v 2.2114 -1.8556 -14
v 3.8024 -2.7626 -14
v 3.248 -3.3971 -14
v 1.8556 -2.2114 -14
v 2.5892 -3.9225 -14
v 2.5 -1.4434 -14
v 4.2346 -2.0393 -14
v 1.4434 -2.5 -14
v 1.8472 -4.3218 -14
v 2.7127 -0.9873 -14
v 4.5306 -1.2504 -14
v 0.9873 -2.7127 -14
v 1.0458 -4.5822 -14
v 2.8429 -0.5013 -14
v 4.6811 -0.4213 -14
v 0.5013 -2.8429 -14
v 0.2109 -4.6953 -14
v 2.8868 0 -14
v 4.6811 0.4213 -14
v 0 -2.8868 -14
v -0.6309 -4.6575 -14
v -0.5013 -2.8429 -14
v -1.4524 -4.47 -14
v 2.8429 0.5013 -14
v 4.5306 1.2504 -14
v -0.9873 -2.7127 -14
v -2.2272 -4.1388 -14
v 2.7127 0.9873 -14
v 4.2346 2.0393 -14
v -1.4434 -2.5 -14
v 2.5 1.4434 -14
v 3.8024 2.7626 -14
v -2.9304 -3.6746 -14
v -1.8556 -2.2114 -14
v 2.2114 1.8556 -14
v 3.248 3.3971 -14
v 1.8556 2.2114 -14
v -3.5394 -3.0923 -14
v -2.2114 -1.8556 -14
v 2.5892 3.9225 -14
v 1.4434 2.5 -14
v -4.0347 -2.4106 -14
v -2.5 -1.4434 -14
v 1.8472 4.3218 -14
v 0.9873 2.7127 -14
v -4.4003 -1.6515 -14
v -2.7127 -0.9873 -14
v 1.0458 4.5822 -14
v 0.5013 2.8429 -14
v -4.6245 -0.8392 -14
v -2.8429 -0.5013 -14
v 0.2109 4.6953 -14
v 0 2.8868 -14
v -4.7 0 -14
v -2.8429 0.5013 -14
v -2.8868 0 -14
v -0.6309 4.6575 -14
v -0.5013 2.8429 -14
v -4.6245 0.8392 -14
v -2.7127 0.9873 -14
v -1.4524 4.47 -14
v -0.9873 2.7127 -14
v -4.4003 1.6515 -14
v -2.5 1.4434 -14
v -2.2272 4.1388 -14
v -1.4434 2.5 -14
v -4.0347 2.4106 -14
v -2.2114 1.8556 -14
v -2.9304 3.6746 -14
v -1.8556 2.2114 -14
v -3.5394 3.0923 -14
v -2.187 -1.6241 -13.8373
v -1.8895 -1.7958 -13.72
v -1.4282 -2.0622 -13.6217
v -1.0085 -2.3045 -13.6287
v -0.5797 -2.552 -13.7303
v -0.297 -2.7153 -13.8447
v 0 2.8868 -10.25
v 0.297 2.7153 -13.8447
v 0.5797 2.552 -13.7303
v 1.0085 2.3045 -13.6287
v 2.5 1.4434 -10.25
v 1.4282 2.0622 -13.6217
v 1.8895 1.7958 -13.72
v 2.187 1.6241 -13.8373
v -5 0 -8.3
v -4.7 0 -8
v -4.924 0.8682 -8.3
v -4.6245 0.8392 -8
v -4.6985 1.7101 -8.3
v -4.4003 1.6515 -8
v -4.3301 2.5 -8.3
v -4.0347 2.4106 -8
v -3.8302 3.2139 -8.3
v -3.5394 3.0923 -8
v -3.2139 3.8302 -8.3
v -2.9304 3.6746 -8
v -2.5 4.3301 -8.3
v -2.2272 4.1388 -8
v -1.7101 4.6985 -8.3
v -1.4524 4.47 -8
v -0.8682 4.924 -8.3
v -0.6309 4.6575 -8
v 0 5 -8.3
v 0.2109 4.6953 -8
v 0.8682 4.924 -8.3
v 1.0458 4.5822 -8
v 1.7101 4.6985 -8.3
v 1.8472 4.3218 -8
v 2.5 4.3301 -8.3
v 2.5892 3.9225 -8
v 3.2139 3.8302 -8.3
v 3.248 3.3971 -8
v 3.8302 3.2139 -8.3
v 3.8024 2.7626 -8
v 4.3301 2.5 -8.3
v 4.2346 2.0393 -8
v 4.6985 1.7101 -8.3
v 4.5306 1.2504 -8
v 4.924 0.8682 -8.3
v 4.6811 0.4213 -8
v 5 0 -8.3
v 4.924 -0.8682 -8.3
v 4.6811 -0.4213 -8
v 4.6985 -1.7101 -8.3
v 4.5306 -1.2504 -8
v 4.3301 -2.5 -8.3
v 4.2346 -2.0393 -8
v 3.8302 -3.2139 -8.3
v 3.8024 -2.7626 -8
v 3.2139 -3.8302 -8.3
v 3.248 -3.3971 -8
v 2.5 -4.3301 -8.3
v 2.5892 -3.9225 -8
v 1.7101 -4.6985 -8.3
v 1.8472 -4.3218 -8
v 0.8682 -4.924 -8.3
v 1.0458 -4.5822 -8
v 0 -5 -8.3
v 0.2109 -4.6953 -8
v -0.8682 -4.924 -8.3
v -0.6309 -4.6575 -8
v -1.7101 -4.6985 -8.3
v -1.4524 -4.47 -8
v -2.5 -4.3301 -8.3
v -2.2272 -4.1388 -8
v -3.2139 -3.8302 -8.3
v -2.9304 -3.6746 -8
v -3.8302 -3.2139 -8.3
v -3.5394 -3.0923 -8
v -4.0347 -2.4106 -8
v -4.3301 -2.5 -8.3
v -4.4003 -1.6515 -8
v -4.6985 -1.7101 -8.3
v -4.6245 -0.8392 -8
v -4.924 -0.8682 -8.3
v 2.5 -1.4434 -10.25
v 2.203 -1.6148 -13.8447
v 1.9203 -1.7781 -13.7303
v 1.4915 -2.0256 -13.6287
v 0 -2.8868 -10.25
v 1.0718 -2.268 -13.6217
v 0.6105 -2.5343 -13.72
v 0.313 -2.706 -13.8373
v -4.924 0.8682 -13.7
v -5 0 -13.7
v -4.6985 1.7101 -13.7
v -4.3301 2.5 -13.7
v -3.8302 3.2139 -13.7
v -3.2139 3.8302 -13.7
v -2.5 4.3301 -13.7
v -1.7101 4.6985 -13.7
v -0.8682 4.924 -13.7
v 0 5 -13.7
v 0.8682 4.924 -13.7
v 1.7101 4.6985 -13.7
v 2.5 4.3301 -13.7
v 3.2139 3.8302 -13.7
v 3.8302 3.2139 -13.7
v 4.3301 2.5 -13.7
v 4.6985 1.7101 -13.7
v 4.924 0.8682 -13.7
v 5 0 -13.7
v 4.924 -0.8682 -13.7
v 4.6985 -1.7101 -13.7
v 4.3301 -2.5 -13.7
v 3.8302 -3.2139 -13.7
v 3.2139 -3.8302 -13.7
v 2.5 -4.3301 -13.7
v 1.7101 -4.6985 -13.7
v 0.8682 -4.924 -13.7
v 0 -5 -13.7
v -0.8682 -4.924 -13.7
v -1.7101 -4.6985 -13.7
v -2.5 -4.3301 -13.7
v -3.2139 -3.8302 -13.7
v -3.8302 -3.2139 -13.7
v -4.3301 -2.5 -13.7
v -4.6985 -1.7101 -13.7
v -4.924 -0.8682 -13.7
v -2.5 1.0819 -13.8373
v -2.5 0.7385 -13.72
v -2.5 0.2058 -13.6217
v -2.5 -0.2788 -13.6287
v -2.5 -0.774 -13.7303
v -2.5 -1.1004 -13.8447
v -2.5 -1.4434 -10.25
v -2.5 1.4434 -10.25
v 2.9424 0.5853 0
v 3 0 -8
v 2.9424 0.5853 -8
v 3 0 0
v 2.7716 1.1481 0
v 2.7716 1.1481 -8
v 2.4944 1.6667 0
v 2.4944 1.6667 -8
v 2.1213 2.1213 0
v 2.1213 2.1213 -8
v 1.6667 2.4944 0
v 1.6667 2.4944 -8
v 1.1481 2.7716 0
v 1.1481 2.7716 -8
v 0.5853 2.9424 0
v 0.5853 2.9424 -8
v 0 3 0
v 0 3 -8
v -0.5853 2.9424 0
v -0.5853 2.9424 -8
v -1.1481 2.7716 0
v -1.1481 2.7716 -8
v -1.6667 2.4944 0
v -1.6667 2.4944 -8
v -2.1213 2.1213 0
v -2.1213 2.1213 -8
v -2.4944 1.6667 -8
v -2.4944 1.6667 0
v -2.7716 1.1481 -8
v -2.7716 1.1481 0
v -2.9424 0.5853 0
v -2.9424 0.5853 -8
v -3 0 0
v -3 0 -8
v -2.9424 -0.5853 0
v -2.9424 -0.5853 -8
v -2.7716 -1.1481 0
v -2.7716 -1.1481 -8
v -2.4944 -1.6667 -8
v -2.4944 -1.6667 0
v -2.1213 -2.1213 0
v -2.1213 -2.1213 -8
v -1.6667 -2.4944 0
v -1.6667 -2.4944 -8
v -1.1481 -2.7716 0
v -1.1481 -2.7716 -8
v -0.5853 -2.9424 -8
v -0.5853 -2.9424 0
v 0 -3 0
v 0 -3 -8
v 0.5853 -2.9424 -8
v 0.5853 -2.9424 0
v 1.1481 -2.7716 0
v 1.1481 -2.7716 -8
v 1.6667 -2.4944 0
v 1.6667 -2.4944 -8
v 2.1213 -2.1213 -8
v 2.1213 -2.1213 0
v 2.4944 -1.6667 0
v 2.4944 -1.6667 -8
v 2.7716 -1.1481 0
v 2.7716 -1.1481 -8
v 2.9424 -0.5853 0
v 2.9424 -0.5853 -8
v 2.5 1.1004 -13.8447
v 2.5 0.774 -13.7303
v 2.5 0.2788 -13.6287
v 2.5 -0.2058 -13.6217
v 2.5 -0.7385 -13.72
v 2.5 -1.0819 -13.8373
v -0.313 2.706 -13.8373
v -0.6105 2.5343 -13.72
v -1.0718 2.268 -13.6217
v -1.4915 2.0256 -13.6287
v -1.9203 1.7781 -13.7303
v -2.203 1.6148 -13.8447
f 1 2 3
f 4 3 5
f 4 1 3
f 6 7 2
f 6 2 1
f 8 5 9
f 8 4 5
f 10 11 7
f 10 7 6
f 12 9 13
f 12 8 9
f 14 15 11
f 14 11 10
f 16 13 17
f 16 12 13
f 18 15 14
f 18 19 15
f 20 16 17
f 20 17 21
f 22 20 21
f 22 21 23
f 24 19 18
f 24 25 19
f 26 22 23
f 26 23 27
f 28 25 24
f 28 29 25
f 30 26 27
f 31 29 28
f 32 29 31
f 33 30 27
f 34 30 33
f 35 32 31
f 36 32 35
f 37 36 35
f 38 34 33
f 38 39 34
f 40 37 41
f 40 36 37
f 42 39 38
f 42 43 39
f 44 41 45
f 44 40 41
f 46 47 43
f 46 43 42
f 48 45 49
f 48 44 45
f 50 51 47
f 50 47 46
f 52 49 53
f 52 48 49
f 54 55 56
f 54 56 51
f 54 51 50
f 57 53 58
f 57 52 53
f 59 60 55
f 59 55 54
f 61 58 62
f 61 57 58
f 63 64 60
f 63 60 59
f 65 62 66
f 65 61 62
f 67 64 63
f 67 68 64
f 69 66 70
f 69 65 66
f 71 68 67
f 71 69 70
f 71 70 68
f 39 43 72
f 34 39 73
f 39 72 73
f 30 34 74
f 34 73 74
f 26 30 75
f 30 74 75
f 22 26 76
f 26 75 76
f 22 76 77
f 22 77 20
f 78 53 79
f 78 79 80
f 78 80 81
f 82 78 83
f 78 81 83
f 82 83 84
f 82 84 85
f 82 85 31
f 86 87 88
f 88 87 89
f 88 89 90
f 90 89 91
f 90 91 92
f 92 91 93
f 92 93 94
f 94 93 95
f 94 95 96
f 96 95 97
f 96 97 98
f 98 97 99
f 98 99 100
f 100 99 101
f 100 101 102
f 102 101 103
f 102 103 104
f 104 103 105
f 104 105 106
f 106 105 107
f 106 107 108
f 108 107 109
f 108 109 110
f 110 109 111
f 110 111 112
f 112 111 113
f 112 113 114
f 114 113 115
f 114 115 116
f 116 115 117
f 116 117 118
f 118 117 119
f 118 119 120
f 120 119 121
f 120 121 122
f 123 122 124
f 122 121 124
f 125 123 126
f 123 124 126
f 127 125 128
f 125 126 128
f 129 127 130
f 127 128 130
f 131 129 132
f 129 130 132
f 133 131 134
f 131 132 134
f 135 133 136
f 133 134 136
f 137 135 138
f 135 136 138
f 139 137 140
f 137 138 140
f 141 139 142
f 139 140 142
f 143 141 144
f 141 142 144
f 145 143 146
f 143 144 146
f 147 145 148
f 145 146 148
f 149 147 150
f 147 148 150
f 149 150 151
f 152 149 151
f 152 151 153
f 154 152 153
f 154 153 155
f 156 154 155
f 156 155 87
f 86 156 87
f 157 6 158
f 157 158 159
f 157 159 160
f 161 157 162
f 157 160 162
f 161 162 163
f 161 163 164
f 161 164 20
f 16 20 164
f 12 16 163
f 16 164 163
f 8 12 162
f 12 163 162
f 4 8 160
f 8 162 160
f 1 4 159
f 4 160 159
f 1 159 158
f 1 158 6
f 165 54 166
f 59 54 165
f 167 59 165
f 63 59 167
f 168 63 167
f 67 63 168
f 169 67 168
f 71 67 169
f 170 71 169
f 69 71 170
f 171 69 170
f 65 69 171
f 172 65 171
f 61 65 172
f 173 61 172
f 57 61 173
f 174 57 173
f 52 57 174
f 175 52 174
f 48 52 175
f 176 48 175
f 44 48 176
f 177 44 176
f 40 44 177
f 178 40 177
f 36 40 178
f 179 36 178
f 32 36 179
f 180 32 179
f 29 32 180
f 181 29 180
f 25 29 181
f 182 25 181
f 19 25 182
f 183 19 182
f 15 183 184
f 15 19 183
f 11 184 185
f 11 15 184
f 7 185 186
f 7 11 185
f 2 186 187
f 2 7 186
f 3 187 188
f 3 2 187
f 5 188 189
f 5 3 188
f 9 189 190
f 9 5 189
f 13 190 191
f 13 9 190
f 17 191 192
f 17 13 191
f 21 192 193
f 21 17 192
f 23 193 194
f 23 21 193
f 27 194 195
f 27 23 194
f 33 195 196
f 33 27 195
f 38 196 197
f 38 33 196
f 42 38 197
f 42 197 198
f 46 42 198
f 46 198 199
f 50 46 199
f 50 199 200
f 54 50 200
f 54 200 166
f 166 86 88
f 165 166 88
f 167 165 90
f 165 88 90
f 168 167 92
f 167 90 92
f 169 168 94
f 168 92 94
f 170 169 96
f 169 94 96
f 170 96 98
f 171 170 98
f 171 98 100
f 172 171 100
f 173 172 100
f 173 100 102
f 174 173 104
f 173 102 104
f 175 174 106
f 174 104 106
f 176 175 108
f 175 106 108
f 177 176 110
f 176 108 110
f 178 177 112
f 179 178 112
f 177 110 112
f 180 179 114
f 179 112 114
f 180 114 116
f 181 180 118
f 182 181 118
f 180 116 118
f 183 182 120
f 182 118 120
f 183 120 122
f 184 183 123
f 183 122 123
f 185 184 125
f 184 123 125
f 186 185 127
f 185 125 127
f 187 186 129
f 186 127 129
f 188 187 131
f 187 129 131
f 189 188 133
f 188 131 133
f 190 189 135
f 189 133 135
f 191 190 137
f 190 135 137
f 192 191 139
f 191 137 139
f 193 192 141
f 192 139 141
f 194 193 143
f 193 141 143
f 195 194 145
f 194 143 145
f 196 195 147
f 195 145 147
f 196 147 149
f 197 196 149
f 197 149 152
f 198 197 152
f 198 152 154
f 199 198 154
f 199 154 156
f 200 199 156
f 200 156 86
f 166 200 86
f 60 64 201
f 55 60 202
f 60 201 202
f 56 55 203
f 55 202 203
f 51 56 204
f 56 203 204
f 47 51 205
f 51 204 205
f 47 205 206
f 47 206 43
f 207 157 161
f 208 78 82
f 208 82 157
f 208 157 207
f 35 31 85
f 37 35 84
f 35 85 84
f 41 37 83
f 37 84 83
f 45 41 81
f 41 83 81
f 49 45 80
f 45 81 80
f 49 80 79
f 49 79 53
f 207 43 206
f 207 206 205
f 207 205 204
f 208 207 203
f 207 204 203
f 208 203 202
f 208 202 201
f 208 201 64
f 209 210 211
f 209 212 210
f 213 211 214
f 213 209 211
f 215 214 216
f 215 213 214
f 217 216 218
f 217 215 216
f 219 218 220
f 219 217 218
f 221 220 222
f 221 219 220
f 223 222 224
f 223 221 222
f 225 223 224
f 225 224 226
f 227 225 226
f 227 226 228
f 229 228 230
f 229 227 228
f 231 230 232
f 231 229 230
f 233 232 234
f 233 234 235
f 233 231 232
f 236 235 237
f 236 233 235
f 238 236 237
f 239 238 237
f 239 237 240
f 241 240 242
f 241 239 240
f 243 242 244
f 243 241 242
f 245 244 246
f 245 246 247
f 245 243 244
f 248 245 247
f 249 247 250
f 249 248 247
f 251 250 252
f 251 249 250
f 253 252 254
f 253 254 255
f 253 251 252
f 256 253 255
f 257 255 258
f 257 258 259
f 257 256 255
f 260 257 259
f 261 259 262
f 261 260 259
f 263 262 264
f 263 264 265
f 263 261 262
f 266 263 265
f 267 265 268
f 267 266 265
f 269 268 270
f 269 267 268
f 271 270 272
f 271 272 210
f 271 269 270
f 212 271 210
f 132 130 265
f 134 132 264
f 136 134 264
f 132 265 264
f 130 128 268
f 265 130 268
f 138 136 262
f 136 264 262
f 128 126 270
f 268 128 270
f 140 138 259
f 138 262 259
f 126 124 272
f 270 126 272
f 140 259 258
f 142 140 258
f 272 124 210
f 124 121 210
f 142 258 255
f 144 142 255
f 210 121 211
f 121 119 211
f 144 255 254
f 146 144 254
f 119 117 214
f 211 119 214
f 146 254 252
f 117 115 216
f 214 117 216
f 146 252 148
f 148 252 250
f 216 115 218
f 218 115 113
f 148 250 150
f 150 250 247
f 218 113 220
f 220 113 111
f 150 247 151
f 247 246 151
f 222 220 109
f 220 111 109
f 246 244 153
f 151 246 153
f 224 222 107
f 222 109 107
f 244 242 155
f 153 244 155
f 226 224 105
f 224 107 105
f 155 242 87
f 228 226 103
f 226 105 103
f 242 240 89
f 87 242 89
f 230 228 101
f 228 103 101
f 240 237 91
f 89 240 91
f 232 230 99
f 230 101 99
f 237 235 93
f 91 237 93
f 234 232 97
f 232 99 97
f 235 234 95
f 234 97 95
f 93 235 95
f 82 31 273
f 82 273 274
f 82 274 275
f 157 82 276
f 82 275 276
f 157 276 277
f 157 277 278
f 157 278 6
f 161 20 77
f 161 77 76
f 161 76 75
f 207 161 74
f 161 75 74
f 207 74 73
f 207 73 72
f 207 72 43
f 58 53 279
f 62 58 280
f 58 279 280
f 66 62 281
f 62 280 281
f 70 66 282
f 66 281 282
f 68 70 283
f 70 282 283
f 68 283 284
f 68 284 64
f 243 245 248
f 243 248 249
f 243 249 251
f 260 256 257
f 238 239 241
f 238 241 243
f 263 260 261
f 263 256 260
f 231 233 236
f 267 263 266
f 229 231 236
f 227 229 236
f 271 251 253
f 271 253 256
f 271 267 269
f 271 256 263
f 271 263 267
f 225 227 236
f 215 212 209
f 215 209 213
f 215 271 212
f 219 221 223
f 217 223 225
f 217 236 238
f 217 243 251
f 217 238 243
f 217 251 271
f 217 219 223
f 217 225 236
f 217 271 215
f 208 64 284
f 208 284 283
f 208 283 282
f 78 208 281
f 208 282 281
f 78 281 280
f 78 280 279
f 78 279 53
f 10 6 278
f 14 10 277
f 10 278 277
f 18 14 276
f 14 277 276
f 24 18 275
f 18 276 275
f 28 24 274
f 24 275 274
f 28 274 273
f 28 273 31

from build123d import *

# Parameters (mm, degrees)
SKETCH1_R          = 3
EXTRUDE1_DEPTH     = 8
SKETCH6_R          = 5
EXTRUDE2_DEPTH     = 6
CUT_EXTRUDE1_DEPTH = 3.75
CHAMFER1_SIZE      = 0.3


with BuildPart() as part:
    # Sketch1 → Extrude1 (new body)
    with BuildSketch(Plane.XY):
        Circle(SKETCH1_R)
    extrude(amount=-EXTRUDE1_DEPTH)

    # Sketch6 → Extrude2 (add)
    with BuildSketch(Plane(origin=(0, 0, -8), x_dir=(-1, 0, 0), z_dir=(0, 0, -1))):
        Circle(SKETCH6_R)
    extrude(amount=EXTRUDE2_DEPTH)

    # Sketch7 → Cut-Extrude1 (cut)
    with BuildSketch(Plane(origin=(0, 0, -14), x_dir=(-1, 0, 0), z_dir=(0, 0, -1))):
        Polygon((0, 2.886751346), (-2.5, 1.443375673), (-2.5, -1.443375673), (0, -2.886751346), (2.5, -1.443375673), (2.5, 1.443375673), align=None)
    extrude(amount=-CUT_EXTRUDE1_DEPTH, mode=Mode.SUBTRACT)

    # Cut-Extrude2 cone 1 section (through the dimple's axis) → Cut-Extrude2 (revolve, cut)
    with BuildSketch(Plane(origin=(0, 0, -14), x_dir=(0, 1, 0), z_dir=(1, 0, 0))):
        Polygon((0, 0), (2.886751346, 0), (0, 2.886751346), align=None)
    revolve(axis=Axis((0, 0, -14), (0, 0, 1)), mode=Mode.SUBTRACT)

    # Chamfer1
    chamfer1_edges = [part.edges().sort_by_distance(p)[0] for p in [
        (5, 0, -8),
        (5, 0, -14),
    ]]
    chamfer(chamfer1_edges, length=CHAMFER1_SIZE)

    # Sketch10 → Revolve1 (revolve)
    with BuildSketch(Plane(origin=(0, 0, 0), x_dir=(0, 0, -1), z_dir=(1, 0, 0)), mode=Mode.PRIVATE) as revolve1_sk:
        Polygon((8, 3), (8, 0), (6.507359313, 0), (7.75, 3), align=None)
    revolve(revolve1_sk.sketch.rotate(Axis((0, 0, -8), (0, 0, 1)), 270), axis=Axis((0, 0, -8), (0, 0, 1)))


solid = part.part
